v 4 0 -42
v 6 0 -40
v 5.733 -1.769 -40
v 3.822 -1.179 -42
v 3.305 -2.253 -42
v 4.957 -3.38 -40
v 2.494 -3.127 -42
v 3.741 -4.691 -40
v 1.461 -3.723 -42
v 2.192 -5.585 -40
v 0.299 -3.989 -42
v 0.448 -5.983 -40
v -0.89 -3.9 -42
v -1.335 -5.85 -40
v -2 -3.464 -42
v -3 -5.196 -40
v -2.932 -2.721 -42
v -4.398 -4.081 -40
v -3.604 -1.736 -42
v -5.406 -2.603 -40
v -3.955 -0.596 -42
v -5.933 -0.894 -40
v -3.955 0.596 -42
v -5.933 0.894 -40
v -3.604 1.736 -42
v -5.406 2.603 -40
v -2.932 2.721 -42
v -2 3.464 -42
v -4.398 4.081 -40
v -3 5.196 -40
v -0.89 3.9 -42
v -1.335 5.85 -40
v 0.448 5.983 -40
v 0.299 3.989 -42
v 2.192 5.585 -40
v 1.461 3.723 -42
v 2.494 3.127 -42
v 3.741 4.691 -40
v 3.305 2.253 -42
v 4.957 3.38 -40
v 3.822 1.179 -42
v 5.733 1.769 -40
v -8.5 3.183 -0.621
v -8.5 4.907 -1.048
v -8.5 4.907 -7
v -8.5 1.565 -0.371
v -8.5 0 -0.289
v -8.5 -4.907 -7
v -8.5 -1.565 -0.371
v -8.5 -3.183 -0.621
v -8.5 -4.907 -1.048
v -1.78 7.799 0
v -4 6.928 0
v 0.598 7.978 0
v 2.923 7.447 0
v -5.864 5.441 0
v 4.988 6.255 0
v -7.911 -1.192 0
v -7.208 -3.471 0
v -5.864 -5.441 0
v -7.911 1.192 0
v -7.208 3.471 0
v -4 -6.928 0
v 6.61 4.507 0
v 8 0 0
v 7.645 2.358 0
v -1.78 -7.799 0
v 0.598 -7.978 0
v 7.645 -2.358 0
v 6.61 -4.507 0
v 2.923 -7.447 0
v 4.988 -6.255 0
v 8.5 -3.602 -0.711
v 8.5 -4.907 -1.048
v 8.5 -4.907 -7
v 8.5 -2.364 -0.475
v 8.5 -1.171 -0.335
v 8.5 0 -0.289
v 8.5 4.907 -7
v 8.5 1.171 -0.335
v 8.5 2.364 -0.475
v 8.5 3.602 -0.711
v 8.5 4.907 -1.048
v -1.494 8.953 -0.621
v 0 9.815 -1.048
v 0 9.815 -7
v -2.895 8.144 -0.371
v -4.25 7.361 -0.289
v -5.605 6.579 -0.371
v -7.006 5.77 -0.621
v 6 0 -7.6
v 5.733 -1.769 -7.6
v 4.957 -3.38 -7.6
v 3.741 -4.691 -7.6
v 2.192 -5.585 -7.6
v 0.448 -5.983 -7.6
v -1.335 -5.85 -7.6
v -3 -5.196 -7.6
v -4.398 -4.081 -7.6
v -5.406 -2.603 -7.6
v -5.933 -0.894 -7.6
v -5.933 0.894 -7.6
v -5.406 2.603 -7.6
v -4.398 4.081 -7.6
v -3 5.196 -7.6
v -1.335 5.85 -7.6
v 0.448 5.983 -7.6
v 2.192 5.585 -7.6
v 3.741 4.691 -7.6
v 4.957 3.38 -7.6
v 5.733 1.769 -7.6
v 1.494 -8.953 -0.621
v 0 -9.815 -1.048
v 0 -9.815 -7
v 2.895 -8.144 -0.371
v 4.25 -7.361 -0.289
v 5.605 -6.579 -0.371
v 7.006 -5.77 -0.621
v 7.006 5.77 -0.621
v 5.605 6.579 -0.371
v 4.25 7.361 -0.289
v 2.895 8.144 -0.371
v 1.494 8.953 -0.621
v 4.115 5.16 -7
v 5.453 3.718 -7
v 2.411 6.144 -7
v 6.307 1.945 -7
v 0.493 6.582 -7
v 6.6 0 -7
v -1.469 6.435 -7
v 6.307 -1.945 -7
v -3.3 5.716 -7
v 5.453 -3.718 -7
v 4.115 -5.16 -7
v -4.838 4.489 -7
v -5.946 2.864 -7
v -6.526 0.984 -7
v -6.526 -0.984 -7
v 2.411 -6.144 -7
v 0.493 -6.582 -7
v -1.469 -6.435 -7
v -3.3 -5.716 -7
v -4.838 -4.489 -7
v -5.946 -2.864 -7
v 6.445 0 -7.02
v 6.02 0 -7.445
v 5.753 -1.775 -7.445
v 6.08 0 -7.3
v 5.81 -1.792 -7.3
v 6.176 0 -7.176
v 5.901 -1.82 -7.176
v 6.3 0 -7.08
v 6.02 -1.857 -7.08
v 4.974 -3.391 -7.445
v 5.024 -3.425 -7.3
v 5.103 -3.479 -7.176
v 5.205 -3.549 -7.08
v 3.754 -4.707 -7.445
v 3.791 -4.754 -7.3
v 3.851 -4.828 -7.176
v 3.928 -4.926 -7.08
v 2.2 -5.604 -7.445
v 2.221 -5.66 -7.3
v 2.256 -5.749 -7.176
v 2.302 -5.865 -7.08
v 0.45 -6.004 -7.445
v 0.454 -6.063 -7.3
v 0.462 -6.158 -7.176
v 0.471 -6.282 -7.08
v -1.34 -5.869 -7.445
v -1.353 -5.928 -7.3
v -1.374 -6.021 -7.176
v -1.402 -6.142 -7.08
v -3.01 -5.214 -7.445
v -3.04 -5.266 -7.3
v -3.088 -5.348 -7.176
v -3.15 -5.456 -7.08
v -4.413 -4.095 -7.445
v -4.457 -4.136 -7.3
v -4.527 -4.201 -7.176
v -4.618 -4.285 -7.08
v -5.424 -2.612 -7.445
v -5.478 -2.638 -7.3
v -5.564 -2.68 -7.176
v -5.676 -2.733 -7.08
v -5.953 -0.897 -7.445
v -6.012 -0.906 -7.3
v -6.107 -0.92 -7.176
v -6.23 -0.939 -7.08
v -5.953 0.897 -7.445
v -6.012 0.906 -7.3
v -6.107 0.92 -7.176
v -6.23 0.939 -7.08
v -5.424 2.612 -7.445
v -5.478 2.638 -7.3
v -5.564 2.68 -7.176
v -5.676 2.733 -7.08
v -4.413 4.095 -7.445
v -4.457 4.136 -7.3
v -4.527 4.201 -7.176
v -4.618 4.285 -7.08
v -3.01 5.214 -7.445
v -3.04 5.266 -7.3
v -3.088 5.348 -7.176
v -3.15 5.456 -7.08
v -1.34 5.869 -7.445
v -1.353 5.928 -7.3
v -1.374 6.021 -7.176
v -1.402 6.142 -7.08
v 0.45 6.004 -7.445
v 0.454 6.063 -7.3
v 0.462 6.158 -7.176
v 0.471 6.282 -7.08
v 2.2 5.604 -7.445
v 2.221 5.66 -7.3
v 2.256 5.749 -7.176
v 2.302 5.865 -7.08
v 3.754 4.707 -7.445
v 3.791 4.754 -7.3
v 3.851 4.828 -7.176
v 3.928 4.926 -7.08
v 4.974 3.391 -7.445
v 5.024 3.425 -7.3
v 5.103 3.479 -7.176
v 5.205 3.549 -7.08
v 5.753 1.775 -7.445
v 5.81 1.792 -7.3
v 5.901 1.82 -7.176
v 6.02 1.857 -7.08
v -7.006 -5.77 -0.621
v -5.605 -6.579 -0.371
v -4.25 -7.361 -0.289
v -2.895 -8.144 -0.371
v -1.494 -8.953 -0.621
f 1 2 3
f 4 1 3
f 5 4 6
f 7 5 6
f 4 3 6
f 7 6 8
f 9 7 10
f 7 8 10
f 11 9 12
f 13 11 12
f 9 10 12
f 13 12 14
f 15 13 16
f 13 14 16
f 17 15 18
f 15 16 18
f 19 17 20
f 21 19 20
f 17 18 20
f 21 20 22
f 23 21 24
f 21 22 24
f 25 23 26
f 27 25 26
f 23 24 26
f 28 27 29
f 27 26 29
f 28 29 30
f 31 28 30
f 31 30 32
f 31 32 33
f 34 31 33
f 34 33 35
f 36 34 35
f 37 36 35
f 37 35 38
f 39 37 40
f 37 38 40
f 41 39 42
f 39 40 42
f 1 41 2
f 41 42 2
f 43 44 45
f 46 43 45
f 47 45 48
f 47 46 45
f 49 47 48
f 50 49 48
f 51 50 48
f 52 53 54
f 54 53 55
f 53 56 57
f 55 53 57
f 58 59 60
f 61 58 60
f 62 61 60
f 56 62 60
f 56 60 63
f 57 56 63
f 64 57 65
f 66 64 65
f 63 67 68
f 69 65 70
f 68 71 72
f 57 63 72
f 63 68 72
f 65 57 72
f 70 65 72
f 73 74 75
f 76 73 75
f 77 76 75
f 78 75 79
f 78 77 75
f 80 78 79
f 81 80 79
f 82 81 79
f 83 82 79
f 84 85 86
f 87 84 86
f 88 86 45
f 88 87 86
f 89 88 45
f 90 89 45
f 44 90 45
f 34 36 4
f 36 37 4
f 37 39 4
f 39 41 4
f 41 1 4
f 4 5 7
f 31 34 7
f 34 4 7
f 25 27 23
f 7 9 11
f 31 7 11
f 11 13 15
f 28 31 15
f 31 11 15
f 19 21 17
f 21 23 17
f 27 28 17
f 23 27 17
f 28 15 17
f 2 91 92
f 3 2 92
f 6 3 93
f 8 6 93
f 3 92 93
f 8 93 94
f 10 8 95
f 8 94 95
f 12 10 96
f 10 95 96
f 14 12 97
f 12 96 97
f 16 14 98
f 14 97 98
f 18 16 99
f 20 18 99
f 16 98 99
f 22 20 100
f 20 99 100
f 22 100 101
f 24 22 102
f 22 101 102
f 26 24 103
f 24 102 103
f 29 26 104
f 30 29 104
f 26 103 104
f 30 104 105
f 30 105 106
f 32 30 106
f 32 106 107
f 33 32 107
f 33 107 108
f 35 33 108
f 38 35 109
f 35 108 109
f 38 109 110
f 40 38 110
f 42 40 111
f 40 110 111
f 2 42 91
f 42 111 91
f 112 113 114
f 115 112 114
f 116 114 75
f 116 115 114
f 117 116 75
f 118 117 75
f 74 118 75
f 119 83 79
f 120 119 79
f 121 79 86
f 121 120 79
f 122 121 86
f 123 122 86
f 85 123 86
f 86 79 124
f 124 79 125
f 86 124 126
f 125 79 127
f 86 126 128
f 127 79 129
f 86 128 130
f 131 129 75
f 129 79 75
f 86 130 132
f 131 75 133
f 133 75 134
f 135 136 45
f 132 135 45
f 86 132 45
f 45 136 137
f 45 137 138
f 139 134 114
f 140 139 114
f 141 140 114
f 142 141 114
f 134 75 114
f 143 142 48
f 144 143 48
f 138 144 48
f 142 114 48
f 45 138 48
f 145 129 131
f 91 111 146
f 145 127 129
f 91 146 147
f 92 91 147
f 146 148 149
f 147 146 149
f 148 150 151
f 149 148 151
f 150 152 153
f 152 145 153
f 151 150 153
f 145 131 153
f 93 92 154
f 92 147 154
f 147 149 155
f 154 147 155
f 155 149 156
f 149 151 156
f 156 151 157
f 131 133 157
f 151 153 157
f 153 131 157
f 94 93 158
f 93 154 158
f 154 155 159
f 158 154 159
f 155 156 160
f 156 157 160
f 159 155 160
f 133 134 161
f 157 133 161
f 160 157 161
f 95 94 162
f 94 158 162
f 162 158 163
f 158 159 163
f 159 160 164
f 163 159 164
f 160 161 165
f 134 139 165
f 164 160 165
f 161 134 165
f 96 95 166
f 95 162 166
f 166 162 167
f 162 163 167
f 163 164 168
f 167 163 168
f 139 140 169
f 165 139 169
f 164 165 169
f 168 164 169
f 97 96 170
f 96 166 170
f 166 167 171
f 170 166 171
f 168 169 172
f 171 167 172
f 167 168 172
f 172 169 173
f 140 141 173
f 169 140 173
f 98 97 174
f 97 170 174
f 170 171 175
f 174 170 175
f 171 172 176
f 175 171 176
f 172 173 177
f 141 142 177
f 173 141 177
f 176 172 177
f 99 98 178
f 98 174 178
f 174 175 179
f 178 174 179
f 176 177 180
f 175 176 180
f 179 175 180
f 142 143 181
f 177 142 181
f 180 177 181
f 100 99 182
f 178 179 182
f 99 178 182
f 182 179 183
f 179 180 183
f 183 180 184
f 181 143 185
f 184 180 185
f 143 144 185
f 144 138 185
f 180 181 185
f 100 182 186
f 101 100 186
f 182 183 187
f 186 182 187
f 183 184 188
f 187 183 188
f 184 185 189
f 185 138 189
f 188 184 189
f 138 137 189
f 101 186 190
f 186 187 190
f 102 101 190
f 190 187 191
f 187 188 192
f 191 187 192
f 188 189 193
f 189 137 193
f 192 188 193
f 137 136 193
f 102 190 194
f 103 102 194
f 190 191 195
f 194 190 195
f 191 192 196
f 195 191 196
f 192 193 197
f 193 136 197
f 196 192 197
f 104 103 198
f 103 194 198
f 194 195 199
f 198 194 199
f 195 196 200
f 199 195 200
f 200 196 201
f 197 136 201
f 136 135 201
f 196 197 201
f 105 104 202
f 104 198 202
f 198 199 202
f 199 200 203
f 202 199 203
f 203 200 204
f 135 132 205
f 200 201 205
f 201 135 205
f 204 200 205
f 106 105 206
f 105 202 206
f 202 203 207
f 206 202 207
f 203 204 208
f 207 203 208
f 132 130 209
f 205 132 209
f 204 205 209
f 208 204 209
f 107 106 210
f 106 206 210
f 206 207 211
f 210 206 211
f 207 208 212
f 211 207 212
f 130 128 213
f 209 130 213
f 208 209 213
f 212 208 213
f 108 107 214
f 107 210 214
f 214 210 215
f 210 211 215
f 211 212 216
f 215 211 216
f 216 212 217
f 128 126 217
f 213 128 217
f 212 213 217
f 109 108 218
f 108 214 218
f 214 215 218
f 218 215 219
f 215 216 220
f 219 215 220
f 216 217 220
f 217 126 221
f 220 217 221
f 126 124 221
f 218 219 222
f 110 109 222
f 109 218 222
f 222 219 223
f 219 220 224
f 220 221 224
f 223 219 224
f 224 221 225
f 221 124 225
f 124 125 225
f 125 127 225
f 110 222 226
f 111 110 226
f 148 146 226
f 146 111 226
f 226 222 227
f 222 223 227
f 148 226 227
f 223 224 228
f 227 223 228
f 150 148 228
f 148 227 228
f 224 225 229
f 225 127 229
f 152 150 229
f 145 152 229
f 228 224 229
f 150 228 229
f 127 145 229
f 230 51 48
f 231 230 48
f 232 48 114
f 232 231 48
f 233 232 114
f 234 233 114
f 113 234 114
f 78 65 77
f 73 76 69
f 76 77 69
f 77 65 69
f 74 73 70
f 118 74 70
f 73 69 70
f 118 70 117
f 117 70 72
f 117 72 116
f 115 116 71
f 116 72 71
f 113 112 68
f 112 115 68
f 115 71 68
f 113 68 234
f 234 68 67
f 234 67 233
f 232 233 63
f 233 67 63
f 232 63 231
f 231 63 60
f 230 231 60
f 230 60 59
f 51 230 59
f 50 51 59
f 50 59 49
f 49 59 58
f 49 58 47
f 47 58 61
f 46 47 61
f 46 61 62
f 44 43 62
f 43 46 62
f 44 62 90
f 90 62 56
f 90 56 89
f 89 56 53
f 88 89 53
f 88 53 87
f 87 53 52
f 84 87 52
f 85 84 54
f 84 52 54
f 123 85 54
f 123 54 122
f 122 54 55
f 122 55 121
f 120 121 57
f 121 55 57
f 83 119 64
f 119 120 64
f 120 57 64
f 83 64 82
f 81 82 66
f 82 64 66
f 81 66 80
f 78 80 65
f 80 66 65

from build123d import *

# Parameters (mm, degrees)
CHAMFER_2_SIZE      = 2
FILLET_2_R          = 0.6
SKETCH_7_OUTSIDE_W  = 32.128
SKETCH_7_OUTSIDE_H  = 32.128
CUT_EXTRUDE_5_DEPTH = 7


with BuildPart() as part:
    # Эскиз1 → Повернуть2 (revolve)
    with BuildSketch(Plane(origin=(0, 0, 0), x_dir=(0, 0, -1), z_dir=(1, 0, 0)), mode=Mode.PRIVATE) as revolve_2_sk:
        Polygon((0, 8), (0, 0), (42, 0), (42, 6), (7, 6), (7, 10), (1.154700538, 10), align=None)
    revolve(revolve_2_sk.sketch.rotate(Axis((0, 0, 0), (0, 0, -1)), 90), axis=Axis((0, 0, 0), (0, 0, -1)))

    # Фаска2
    chamfer_2_edges = [part.edges().sort_by_distance(p)[0] for p in [
        (-6, 0, -42),
    ]]
    chamfer(chamfer_2_edges, length=CHAMFER_2_SIZE)

    # Скругление2
    fillet_2_edges = [part.edges().sort_by_distance(p)[0] for p in [
        (-6, 0, -7),
    ]]
    fillet(fillet_2_edges, radius=FILLET_2_R)

    # Эскиз7 outside → Вырез-Вытянуть5 (cut)
    with BuildSketch(Plane.XY):
        Rectangle(SKETCH_7_OUTSIDE_W, SKETCH_7_OUTSIDE_H)
        Polygon((0, 9.814954576), (-8.5, 4.907477288), (-8.5, -4.907477288), (0, -9.814954576), (8.5, -4.907477288), (8.5, 4.907477288), align=None, mode=Mode.SUBTRACT)
    extrude(amount=-CUT_EXTRUDE_5_DEPTH, mode=Mode.SUBTRACT)


solid = part.part
